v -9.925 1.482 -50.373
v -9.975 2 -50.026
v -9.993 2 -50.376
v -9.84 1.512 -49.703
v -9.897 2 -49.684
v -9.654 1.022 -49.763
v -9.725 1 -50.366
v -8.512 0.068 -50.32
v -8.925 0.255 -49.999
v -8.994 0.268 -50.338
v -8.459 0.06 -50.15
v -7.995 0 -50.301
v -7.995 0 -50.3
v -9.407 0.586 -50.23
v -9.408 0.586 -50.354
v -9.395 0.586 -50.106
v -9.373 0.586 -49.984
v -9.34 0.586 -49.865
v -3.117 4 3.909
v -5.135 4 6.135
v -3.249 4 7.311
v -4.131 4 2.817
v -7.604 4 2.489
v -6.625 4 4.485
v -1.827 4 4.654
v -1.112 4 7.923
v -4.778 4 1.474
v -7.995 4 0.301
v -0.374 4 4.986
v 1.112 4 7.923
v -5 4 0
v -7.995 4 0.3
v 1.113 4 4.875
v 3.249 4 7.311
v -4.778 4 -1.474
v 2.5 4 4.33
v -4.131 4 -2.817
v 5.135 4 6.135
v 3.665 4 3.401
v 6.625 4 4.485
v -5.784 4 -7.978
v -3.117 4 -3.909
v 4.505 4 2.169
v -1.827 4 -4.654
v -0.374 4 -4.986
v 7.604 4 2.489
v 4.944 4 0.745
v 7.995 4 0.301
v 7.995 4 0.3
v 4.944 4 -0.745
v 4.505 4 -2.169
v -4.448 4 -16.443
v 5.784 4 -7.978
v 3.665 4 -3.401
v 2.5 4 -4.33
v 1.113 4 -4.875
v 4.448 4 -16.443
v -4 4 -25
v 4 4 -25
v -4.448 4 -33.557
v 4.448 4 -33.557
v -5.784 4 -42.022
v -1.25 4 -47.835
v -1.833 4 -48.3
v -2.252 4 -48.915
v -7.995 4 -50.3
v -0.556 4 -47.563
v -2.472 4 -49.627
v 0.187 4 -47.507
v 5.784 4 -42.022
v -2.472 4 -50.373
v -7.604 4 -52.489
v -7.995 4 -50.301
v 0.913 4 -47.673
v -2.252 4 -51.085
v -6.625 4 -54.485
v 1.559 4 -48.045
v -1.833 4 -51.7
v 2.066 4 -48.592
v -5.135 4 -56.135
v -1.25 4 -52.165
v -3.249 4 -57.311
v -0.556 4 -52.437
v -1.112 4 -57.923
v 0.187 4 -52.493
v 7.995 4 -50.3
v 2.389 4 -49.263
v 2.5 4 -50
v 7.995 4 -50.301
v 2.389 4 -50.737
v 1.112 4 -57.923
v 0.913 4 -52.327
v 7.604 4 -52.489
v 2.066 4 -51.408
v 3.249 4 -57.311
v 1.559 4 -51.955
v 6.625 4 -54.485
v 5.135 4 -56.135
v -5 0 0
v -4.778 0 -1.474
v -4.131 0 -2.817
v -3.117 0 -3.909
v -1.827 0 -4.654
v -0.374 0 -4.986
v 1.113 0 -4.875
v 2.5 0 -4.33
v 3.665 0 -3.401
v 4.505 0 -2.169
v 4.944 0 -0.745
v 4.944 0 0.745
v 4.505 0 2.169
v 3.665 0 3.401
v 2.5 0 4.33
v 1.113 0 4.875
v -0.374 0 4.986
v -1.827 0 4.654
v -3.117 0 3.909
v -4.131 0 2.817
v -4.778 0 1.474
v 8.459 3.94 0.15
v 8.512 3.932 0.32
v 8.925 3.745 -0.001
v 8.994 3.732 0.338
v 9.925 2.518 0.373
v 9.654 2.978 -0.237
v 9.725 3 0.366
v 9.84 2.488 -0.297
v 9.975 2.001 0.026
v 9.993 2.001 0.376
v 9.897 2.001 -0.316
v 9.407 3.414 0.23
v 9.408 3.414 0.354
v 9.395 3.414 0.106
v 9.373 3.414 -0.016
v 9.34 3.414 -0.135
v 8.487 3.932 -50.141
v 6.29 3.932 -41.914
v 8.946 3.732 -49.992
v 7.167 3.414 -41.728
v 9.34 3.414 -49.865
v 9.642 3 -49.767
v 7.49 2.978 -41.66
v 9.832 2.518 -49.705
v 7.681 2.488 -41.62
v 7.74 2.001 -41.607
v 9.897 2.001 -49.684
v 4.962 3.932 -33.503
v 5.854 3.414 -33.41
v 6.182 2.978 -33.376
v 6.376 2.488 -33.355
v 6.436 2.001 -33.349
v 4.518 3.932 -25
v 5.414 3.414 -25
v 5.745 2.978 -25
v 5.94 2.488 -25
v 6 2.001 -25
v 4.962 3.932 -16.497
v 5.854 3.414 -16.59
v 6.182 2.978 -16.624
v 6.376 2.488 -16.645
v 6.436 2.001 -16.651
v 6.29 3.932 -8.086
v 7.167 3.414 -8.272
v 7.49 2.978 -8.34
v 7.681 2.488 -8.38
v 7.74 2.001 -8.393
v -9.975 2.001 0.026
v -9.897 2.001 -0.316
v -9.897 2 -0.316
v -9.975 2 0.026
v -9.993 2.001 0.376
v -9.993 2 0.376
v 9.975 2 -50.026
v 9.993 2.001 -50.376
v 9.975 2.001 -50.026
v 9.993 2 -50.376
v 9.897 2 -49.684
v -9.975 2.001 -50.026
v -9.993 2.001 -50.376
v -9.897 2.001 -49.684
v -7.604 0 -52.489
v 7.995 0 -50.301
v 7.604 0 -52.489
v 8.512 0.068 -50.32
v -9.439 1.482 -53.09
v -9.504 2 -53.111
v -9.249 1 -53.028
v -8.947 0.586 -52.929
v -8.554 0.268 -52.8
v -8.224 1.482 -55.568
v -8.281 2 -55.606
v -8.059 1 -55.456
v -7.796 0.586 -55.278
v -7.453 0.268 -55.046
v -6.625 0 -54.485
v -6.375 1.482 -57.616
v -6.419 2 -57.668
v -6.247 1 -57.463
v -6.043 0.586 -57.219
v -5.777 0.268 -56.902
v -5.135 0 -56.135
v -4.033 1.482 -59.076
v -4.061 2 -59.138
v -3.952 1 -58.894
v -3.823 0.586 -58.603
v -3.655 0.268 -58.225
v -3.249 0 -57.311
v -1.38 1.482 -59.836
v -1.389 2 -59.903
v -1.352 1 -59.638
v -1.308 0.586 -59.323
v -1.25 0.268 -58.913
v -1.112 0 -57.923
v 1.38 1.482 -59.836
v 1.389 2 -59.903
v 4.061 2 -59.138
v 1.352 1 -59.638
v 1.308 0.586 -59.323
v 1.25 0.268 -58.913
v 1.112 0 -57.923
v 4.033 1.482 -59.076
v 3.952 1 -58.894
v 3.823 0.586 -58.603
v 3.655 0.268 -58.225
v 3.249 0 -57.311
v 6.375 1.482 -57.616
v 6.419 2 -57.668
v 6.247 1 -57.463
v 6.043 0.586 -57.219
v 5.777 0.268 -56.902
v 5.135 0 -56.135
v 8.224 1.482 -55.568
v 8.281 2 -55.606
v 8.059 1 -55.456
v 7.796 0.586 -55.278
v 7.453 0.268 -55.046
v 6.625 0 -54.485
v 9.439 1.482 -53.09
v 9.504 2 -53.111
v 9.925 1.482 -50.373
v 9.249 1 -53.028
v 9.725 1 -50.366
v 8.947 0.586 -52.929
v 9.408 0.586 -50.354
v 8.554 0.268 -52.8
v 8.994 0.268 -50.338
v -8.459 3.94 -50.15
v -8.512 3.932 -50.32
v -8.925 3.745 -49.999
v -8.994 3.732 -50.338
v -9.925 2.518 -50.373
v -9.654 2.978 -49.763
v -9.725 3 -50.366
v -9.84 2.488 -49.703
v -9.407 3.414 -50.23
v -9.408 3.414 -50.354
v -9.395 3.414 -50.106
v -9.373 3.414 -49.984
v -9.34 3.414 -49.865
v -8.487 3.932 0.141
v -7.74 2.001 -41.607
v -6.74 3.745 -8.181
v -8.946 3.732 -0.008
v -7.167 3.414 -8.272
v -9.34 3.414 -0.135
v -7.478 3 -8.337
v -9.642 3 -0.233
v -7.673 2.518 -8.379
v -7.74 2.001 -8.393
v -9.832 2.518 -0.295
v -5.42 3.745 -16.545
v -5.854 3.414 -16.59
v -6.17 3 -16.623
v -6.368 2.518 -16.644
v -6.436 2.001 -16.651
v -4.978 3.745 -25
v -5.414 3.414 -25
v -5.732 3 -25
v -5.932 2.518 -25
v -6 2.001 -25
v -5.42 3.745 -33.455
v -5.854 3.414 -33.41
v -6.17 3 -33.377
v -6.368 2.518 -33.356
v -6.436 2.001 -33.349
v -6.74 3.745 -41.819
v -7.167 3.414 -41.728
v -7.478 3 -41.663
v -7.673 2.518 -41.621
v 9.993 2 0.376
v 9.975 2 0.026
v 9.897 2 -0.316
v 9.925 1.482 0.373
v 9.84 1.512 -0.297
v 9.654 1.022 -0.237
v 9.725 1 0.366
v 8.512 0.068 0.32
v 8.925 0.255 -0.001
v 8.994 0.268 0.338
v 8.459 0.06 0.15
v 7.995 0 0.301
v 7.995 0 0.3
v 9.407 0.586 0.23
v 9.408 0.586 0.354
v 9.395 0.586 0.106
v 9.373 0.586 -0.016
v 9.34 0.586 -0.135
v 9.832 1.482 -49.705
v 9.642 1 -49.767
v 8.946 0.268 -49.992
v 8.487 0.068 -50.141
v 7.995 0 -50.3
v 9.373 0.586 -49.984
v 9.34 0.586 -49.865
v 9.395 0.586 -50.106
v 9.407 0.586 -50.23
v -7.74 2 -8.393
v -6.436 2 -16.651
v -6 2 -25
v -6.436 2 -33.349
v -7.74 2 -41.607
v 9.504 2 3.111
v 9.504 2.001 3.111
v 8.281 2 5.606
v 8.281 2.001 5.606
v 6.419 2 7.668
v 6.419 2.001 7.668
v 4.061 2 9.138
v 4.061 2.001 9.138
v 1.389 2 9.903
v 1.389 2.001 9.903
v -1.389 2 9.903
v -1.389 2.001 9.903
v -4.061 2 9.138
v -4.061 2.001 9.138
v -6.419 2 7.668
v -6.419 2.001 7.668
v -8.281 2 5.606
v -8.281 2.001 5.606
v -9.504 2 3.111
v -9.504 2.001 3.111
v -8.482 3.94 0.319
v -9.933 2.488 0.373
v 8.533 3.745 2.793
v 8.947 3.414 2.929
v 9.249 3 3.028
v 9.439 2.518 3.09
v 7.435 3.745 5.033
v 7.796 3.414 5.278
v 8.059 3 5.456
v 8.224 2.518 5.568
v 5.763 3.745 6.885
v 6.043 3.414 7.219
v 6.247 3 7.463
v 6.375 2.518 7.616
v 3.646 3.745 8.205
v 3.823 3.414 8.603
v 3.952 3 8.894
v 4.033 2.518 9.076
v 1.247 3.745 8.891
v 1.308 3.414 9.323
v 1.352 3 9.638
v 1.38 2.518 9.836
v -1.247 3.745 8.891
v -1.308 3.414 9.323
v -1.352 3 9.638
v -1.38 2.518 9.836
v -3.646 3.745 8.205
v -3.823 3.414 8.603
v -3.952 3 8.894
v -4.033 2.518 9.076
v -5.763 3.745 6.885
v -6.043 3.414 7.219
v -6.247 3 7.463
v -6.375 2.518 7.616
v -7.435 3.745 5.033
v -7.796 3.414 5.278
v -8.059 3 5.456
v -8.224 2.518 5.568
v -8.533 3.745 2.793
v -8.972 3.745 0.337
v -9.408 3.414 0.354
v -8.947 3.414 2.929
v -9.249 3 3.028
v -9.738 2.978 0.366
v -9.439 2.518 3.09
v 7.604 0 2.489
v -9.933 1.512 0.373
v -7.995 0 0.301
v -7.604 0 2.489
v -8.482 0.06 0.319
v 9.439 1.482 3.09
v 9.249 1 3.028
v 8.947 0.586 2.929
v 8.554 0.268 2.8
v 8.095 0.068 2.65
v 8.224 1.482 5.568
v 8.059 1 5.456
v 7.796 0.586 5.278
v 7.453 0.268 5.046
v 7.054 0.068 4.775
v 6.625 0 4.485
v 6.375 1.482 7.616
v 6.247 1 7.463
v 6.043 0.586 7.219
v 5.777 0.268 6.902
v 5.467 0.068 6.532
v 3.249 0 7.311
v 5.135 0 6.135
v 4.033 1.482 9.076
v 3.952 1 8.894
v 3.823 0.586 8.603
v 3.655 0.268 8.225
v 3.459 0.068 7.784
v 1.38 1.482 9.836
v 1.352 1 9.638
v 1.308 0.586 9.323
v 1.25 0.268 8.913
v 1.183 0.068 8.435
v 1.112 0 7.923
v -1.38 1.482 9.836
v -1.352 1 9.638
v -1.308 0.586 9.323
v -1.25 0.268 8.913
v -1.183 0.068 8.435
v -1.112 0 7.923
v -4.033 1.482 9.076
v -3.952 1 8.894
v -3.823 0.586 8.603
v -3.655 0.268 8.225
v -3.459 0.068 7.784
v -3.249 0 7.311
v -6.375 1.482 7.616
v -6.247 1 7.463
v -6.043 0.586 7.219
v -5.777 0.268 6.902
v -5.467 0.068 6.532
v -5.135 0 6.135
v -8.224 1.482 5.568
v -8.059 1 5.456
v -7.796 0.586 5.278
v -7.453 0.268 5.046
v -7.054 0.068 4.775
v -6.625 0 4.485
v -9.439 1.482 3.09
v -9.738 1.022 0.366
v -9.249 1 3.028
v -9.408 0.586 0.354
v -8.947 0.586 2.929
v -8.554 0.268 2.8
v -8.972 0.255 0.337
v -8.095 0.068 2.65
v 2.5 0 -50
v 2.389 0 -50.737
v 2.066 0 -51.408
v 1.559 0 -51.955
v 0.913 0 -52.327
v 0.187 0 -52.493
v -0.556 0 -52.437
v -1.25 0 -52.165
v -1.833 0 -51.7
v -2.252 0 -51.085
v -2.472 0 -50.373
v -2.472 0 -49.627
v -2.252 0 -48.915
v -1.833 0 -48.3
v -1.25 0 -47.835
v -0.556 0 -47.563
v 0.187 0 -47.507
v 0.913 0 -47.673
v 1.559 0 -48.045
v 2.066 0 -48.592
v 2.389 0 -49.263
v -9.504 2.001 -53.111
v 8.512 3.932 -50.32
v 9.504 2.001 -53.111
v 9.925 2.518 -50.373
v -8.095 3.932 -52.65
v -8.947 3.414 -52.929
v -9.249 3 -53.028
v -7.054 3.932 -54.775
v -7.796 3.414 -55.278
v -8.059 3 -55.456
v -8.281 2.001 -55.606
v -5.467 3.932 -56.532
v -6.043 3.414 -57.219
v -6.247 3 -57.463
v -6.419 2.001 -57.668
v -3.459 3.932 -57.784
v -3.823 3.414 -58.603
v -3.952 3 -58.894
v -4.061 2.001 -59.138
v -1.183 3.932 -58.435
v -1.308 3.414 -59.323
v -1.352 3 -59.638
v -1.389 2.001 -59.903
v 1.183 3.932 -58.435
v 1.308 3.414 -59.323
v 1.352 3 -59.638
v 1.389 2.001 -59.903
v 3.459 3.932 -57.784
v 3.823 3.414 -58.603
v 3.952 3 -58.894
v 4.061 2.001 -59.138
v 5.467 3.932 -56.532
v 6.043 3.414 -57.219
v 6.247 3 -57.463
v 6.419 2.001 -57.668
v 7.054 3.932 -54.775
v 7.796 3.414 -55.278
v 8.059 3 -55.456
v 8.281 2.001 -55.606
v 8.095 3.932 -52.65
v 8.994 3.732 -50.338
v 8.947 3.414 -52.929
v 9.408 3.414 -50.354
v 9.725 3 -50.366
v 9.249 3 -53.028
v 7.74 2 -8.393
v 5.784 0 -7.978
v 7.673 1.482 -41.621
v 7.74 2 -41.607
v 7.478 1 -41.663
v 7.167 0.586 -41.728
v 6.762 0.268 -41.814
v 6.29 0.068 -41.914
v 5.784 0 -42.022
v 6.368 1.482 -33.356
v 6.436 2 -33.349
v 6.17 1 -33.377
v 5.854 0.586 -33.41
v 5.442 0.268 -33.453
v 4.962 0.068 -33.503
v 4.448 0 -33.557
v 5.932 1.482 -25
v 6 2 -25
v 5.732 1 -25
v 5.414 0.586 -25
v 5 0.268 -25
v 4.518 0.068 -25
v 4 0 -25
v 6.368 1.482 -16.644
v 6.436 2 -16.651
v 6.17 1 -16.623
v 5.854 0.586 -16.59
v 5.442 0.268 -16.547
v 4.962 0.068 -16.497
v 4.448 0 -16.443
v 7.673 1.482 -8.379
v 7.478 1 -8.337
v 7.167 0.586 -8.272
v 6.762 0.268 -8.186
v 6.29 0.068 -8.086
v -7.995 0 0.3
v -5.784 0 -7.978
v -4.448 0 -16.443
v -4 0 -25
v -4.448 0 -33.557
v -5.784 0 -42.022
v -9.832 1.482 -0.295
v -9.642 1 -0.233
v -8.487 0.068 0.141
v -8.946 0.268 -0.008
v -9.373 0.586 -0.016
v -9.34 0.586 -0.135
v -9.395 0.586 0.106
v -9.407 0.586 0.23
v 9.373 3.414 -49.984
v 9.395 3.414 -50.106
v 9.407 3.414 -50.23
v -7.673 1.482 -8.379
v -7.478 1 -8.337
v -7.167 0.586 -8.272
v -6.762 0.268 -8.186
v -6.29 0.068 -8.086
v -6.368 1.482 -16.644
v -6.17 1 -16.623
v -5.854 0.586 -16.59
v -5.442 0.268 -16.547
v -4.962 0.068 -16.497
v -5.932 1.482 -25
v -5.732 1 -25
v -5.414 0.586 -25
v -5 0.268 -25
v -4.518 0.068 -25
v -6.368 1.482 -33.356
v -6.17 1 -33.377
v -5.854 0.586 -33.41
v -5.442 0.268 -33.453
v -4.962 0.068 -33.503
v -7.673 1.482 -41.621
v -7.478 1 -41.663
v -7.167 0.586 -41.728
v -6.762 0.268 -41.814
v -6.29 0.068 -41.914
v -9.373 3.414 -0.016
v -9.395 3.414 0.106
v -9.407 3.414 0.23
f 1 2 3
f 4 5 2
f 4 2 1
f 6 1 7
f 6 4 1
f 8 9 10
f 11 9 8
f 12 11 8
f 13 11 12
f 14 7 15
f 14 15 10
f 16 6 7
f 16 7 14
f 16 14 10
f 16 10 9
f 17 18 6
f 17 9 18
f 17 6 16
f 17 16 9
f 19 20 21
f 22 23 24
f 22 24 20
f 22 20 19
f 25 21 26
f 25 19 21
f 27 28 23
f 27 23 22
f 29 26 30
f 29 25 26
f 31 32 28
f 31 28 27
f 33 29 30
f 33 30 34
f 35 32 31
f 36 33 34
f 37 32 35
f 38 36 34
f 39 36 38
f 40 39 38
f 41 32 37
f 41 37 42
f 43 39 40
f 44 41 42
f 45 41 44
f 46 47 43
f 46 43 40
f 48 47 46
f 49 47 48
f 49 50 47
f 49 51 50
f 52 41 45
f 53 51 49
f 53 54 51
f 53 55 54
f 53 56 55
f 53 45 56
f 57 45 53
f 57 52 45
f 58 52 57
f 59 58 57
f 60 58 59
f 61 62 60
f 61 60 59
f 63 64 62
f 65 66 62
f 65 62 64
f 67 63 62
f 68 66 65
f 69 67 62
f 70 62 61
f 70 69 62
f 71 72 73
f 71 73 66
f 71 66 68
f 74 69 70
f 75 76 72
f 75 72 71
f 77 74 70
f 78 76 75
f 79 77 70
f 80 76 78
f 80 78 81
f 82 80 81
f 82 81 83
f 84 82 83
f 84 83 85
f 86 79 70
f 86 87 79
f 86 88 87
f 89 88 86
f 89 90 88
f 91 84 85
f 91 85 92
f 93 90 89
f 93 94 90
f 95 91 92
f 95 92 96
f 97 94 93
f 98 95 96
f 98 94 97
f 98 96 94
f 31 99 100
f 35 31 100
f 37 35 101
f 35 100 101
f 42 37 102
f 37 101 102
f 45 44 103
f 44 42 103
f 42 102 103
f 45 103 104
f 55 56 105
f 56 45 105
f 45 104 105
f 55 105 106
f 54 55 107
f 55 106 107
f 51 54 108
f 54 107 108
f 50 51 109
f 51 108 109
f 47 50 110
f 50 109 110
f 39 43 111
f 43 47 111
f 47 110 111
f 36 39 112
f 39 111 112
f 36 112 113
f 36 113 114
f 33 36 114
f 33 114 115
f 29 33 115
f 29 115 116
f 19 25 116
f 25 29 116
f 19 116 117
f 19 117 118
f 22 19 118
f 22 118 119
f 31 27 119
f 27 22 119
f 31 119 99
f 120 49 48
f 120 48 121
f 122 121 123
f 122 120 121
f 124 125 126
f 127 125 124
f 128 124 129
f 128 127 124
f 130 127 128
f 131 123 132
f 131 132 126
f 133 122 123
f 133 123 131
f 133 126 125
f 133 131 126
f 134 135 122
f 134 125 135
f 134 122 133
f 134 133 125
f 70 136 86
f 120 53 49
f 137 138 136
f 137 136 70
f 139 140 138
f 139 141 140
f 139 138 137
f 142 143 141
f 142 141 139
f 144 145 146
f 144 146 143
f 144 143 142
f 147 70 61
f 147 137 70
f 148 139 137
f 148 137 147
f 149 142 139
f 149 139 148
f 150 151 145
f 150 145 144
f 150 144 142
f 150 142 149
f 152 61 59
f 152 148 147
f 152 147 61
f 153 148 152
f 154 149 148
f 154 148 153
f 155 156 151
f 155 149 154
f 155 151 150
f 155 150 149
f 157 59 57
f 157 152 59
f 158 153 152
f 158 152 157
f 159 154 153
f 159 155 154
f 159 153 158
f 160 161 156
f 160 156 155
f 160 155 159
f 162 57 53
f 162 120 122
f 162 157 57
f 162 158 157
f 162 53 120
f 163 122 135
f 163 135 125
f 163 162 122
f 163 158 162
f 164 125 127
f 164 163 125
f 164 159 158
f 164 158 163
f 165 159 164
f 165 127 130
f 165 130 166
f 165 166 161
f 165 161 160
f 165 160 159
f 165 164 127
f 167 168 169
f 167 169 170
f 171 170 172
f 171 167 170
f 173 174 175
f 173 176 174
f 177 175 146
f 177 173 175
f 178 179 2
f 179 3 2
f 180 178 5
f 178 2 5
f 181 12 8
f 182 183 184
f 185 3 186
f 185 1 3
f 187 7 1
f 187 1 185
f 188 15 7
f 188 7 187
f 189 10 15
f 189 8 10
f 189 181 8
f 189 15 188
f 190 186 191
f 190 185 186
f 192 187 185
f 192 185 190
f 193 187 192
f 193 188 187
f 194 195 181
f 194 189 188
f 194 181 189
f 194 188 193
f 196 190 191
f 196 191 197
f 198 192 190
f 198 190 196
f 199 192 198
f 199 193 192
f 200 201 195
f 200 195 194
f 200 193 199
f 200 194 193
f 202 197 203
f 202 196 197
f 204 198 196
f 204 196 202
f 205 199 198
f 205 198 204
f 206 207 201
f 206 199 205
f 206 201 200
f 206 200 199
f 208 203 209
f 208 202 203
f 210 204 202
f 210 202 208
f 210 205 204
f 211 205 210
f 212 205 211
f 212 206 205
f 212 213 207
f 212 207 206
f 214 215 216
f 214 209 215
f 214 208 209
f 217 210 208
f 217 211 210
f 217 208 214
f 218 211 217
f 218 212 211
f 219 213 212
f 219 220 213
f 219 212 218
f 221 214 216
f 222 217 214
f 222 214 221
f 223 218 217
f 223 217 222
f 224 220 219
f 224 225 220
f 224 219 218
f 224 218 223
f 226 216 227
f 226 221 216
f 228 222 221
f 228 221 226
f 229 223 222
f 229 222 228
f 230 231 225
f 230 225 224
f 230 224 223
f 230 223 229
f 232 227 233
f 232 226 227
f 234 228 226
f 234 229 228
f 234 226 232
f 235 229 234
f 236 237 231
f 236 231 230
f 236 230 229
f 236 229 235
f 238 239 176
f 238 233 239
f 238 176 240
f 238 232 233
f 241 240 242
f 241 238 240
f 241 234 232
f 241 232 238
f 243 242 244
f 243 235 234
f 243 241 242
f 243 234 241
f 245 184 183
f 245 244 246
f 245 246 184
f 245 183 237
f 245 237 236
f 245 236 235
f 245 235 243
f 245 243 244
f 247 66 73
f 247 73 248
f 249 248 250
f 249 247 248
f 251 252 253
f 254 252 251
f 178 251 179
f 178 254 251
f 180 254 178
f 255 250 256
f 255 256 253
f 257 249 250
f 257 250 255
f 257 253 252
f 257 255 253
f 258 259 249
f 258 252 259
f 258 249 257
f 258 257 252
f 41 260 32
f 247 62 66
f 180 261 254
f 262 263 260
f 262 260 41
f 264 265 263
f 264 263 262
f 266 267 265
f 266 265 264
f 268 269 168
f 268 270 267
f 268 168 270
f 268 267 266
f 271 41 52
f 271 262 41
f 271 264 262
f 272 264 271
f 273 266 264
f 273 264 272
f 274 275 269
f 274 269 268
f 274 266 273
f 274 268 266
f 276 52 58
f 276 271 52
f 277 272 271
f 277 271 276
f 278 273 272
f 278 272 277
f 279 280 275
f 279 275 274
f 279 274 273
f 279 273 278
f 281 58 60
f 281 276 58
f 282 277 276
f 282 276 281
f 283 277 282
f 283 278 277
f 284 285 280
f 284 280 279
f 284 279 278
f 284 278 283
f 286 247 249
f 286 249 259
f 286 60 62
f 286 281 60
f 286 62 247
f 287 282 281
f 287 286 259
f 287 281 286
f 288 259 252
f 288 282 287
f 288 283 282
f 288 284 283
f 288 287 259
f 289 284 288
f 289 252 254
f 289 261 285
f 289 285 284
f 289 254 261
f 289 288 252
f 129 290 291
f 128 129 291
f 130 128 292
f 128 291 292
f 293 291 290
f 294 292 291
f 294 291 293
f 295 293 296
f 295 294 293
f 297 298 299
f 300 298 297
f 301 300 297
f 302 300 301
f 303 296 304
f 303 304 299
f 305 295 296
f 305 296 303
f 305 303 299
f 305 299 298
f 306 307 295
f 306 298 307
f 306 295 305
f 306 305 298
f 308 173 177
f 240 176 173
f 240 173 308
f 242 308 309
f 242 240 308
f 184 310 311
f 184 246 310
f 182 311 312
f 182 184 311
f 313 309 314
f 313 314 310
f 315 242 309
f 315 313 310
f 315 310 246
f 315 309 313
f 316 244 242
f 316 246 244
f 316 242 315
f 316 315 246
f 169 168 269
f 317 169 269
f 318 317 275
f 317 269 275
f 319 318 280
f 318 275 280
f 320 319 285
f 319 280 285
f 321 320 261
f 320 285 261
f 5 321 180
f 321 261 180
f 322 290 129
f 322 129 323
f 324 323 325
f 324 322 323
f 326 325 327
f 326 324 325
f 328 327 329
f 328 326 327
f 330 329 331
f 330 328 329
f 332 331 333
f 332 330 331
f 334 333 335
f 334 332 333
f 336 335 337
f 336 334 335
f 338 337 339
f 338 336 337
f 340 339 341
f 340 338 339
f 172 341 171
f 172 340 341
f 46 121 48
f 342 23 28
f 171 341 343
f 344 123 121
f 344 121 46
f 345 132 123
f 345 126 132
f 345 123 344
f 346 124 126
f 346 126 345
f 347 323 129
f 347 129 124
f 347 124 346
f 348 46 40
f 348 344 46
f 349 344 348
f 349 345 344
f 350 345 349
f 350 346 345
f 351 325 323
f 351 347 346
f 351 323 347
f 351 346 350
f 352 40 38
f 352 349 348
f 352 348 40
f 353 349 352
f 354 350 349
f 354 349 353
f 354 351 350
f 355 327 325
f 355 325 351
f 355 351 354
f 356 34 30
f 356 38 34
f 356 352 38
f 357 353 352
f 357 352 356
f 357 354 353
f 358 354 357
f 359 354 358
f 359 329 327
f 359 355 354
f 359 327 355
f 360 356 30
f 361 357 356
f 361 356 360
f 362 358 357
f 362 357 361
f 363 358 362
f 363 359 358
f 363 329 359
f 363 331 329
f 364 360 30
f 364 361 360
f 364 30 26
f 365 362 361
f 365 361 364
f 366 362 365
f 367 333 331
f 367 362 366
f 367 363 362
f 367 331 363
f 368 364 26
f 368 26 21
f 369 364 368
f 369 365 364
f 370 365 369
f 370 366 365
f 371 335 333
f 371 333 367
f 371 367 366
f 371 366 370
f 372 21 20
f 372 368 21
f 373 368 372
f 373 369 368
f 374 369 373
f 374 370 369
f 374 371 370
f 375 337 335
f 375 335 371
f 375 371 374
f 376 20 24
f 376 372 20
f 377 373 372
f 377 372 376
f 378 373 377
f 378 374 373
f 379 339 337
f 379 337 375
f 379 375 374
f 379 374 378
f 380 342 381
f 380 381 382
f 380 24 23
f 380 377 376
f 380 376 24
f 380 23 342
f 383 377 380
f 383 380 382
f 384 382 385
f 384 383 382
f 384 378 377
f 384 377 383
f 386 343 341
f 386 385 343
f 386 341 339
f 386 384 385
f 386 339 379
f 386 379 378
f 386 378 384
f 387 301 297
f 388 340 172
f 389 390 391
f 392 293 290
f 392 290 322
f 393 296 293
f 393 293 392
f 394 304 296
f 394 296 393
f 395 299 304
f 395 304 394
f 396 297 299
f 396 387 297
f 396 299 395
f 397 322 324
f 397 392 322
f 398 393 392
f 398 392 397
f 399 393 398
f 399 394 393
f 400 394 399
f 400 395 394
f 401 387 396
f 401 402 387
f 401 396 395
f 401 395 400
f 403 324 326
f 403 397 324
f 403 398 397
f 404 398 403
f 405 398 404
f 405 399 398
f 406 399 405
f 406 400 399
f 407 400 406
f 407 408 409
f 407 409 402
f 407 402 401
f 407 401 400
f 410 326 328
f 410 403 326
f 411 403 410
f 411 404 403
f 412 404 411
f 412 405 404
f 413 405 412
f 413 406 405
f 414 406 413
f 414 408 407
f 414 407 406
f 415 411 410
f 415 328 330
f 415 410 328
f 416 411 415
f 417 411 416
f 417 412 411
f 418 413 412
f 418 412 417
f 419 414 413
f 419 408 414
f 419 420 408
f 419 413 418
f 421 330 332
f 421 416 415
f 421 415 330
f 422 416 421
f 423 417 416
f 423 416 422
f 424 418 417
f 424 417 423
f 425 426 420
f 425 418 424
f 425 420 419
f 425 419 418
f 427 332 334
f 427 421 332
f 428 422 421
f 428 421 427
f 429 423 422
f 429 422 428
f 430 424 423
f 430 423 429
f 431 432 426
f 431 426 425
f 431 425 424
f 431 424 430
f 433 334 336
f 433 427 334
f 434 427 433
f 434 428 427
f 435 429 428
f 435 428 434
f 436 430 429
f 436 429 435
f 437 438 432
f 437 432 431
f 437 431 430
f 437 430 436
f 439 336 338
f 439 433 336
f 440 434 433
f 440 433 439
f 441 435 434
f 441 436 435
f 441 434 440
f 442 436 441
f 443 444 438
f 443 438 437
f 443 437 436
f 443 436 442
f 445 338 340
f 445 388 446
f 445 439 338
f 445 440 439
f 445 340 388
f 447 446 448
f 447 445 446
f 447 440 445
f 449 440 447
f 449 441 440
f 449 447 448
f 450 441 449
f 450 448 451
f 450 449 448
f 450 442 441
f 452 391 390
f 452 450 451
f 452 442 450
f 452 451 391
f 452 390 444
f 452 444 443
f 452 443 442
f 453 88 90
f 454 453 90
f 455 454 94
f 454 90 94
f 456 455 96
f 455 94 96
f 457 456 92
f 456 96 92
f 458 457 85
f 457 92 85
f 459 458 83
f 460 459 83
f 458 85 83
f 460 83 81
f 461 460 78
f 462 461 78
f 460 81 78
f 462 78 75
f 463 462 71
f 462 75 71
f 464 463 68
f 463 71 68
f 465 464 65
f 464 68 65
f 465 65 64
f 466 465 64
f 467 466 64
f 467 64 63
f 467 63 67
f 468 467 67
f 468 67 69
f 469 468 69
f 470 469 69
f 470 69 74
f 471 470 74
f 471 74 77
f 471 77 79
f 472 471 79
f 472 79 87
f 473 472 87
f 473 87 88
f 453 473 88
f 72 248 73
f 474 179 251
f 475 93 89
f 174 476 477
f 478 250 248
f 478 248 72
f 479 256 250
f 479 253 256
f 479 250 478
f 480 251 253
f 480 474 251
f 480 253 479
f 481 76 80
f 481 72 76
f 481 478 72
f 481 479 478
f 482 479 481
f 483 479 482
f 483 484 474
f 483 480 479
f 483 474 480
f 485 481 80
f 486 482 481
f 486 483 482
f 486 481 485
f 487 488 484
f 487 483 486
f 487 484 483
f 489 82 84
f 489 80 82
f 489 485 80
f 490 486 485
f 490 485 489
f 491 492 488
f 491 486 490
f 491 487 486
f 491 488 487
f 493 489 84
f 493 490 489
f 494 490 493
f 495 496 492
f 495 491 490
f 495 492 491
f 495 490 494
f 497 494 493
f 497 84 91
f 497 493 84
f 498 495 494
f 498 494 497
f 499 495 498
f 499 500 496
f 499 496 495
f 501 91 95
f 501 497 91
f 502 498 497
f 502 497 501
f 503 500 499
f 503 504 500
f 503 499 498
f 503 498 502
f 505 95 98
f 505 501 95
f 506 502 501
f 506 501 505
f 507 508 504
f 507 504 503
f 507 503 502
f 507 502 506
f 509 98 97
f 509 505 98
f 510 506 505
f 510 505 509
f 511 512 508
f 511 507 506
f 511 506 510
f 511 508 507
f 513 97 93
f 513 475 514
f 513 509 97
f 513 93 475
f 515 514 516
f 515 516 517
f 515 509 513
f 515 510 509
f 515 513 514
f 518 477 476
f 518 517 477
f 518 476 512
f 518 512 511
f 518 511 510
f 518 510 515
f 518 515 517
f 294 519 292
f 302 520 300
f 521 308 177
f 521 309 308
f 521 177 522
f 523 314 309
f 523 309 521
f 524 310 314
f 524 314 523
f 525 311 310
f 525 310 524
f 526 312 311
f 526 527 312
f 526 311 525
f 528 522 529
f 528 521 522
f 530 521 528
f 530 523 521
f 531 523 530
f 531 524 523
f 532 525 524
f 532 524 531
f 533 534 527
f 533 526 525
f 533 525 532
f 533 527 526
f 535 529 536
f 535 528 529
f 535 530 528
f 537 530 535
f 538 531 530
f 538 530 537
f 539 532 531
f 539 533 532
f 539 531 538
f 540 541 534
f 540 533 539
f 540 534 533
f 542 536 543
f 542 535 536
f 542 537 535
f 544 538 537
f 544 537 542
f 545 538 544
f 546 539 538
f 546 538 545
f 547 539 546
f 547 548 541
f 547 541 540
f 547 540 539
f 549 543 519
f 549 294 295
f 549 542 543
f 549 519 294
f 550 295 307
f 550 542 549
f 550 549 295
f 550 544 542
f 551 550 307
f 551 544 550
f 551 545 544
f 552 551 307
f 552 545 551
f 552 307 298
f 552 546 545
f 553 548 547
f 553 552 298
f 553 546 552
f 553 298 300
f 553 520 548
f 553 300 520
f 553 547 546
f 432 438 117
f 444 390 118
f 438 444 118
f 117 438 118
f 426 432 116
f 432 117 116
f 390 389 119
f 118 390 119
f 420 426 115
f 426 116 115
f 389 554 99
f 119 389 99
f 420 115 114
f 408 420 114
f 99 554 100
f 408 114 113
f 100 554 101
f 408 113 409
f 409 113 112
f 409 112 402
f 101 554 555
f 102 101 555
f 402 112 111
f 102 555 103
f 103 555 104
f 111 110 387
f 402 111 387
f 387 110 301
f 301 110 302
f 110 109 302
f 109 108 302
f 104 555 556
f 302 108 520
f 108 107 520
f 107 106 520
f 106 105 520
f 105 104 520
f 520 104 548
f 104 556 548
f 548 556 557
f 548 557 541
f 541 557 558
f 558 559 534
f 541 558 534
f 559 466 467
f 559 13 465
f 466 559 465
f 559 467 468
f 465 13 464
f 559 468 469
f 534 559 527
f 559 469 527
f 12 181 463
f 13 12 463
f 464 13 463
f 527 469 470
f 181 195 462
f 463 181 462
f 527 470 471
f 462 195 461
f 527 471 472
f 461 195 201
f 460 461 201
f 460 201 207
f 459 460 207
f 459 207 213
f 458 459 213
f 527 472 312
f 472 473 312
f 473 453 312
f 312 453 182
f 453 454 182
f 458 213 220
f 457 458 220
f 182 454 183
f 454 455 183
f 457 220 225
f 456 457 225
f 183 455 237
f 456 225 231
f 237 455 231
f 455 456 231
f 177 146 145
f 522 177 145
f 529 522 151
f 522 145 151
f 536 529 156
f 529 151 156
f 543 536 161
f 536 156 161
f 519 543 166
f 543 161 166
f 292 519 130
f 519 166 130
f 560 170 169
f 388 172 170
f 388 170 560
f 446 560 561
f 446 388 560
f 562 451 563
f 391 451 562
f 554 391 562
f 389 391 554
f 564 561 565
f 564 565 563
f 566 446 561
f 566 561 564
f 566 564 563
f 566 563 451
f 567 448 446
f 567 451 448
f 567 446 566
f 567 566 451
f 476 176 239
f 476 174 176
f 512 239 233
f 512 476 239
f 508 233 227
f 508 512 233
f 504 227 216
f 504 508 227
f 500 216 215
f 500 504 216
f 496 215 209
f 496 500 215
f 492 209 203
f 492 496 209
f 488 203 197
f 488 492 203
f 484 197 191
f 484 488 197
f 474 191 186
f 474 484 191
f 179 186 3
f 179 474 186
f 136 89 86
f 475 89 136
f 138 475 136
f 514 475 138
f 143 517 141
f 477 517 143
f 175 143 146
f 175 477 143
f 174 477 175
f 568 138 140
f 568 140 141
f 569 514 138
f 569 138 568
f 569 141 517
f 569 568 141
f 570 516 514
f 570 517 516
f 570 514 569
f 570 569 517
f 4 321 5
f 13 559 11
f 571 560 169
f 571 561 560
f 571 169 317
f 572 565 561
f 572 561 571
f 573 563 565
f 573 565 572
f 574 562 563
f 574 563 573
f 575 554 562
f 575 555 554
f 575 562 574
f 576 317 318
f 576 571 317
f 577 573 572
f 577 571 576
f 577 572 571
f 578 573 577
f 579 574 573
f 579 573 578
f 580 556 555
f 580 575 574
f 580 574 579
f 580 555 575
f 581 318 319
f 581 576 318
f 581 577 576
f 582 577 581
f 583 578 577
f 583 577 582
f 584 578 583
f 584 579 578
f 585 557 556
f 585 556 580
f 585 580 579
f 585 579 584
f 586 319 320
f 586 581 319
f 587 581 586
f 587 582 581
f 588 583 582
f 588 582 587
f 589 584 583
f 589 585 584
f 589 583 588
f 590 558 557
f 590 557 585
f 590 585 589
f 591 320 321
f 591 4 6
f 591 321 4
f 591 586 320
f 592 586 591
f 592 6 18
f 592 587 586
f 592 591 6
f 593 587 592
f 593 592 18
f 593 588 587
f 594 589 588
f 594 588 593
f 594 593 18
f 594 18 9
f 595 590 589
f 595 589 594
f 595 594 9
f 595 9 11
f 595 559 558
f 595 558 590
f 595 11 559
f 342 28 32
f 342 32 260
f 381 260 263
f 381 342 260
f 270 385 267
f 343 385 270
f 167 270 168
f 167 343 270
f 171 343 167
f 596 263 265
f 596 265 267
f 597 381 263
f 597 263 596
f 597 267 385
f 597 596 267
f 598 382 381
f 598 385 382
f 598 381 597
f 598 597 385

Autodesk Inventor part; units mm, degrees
ref_plane "YZ Plane" through (0, 0, 0) normal (1, 0, 0) x (0, 1, 0)
ref_plane "XZ Plane" through (0, 0, 0) normal (0, 1, 0) x (-1, 0, 0)
ref_plane "XY Plane" through (0, 0, 0) normal (0, 0, 1) x (1, 0, 0)
sketch "Sketch1" plane through (0, 0, 0) normal (0, 1, 0) x (-1, 0, 0)
  circle A0 centre (0, 0) radius 10
  circle A1 centre (0, 0) radius 5
  dimension "d0" = 20
extrude "Extrusion1" add sketch "Sketch1" along normal blind 4
sketch "Sketch2" plane through (0, 4, 0) normal (0, 1, 0) x (1, 0, 0)
  circle A0 centre (0, 0) radius 10 projected
  line L0 (-10, 0) -> (10, 0)
  line L1 (10, 0) -> (10, 50)
  line L2 (10, 50) -> (-10, 50)
  line L3 (-10, 50) -> (-10, 0)
  dimension "d3" = 50
extrude "Extrusion2" add sketch "Sketch2" against normal blind 4 contours A0 L3 L2 L1
sketch "Sketch3" plane through (0, 4, 0) normal (0, 1, 0) x (1, 0, 0)
  line L0 (-10, 50) -> (10, 50) projected
  circle A0 centre (0, 50) radius 10
  point P0 (0, 0)
  point P1 (-10, 50)
  dimension "d19" = 20
extrude "Extrusion3" add sketch "Sketch3" against normal blind 4 contours A0 L0 picked at (2.78, 54.5572)
sketch "Sketch5" plane through (0, 4, 0) normal (0, 1, 0) x (1, 0, 0)
  arc A0 (-10, 0) -> (10, 0) centre (0, 0) ccw projected
  line L0 (-10, 0) -> (-10, 50) projected
  arc A1 (-10, 0) -> (-10, 50) centre (-86.125, 25) ccw
  line L1 (10, 50) -> (10, 0) projected
  arc A2 (10, 50) -> (10, 0) centre (86.125, 25) ccw
extrude "Extrusion4" cut sketch "Sketch5" against normal blind 4
fillet "Fillet1" radius 2 1 edges at (10, 2, -50)
fillet "Fillet2" radius 2 1 edges at (-10, 2, -50)
fillet "Fillet3" radius 2 1 edges at (-10, 2, 0)
fillet "Fillet4" radius 2 1 edges at (10, 2, 0)
sketch "Sketch6" plane through (0, 4, 0) normal (0, 1, 0) x (1, 0, 0)
  arc A0 (9.9929, 50.3757) -> (-9.9929, 50.3757) centre (0, 50) ccw projected
  circle A1 centre (0, 50) radius 2.5
  point P0 (0, 0)
  dimension "d14" = 5
extrude "Extrusion5" cut sketch "Sketch6" against normal blind 4
fillet "Fillet5" radius 2 5 edges at (0, 4, -60) (-9.9754, 4, 0.0258) (0, 4, 10) (9.9754, 4, 0.0258) (6, 4, -25)
fillet "Fillet6" radius 2 5 edges at (0, 0, -60) (6, 0, -25) (9.9754, 0, 0.0258) (0, 0, 10) (-9.9754, 0, 0.0258)
properties part number "Arm"
